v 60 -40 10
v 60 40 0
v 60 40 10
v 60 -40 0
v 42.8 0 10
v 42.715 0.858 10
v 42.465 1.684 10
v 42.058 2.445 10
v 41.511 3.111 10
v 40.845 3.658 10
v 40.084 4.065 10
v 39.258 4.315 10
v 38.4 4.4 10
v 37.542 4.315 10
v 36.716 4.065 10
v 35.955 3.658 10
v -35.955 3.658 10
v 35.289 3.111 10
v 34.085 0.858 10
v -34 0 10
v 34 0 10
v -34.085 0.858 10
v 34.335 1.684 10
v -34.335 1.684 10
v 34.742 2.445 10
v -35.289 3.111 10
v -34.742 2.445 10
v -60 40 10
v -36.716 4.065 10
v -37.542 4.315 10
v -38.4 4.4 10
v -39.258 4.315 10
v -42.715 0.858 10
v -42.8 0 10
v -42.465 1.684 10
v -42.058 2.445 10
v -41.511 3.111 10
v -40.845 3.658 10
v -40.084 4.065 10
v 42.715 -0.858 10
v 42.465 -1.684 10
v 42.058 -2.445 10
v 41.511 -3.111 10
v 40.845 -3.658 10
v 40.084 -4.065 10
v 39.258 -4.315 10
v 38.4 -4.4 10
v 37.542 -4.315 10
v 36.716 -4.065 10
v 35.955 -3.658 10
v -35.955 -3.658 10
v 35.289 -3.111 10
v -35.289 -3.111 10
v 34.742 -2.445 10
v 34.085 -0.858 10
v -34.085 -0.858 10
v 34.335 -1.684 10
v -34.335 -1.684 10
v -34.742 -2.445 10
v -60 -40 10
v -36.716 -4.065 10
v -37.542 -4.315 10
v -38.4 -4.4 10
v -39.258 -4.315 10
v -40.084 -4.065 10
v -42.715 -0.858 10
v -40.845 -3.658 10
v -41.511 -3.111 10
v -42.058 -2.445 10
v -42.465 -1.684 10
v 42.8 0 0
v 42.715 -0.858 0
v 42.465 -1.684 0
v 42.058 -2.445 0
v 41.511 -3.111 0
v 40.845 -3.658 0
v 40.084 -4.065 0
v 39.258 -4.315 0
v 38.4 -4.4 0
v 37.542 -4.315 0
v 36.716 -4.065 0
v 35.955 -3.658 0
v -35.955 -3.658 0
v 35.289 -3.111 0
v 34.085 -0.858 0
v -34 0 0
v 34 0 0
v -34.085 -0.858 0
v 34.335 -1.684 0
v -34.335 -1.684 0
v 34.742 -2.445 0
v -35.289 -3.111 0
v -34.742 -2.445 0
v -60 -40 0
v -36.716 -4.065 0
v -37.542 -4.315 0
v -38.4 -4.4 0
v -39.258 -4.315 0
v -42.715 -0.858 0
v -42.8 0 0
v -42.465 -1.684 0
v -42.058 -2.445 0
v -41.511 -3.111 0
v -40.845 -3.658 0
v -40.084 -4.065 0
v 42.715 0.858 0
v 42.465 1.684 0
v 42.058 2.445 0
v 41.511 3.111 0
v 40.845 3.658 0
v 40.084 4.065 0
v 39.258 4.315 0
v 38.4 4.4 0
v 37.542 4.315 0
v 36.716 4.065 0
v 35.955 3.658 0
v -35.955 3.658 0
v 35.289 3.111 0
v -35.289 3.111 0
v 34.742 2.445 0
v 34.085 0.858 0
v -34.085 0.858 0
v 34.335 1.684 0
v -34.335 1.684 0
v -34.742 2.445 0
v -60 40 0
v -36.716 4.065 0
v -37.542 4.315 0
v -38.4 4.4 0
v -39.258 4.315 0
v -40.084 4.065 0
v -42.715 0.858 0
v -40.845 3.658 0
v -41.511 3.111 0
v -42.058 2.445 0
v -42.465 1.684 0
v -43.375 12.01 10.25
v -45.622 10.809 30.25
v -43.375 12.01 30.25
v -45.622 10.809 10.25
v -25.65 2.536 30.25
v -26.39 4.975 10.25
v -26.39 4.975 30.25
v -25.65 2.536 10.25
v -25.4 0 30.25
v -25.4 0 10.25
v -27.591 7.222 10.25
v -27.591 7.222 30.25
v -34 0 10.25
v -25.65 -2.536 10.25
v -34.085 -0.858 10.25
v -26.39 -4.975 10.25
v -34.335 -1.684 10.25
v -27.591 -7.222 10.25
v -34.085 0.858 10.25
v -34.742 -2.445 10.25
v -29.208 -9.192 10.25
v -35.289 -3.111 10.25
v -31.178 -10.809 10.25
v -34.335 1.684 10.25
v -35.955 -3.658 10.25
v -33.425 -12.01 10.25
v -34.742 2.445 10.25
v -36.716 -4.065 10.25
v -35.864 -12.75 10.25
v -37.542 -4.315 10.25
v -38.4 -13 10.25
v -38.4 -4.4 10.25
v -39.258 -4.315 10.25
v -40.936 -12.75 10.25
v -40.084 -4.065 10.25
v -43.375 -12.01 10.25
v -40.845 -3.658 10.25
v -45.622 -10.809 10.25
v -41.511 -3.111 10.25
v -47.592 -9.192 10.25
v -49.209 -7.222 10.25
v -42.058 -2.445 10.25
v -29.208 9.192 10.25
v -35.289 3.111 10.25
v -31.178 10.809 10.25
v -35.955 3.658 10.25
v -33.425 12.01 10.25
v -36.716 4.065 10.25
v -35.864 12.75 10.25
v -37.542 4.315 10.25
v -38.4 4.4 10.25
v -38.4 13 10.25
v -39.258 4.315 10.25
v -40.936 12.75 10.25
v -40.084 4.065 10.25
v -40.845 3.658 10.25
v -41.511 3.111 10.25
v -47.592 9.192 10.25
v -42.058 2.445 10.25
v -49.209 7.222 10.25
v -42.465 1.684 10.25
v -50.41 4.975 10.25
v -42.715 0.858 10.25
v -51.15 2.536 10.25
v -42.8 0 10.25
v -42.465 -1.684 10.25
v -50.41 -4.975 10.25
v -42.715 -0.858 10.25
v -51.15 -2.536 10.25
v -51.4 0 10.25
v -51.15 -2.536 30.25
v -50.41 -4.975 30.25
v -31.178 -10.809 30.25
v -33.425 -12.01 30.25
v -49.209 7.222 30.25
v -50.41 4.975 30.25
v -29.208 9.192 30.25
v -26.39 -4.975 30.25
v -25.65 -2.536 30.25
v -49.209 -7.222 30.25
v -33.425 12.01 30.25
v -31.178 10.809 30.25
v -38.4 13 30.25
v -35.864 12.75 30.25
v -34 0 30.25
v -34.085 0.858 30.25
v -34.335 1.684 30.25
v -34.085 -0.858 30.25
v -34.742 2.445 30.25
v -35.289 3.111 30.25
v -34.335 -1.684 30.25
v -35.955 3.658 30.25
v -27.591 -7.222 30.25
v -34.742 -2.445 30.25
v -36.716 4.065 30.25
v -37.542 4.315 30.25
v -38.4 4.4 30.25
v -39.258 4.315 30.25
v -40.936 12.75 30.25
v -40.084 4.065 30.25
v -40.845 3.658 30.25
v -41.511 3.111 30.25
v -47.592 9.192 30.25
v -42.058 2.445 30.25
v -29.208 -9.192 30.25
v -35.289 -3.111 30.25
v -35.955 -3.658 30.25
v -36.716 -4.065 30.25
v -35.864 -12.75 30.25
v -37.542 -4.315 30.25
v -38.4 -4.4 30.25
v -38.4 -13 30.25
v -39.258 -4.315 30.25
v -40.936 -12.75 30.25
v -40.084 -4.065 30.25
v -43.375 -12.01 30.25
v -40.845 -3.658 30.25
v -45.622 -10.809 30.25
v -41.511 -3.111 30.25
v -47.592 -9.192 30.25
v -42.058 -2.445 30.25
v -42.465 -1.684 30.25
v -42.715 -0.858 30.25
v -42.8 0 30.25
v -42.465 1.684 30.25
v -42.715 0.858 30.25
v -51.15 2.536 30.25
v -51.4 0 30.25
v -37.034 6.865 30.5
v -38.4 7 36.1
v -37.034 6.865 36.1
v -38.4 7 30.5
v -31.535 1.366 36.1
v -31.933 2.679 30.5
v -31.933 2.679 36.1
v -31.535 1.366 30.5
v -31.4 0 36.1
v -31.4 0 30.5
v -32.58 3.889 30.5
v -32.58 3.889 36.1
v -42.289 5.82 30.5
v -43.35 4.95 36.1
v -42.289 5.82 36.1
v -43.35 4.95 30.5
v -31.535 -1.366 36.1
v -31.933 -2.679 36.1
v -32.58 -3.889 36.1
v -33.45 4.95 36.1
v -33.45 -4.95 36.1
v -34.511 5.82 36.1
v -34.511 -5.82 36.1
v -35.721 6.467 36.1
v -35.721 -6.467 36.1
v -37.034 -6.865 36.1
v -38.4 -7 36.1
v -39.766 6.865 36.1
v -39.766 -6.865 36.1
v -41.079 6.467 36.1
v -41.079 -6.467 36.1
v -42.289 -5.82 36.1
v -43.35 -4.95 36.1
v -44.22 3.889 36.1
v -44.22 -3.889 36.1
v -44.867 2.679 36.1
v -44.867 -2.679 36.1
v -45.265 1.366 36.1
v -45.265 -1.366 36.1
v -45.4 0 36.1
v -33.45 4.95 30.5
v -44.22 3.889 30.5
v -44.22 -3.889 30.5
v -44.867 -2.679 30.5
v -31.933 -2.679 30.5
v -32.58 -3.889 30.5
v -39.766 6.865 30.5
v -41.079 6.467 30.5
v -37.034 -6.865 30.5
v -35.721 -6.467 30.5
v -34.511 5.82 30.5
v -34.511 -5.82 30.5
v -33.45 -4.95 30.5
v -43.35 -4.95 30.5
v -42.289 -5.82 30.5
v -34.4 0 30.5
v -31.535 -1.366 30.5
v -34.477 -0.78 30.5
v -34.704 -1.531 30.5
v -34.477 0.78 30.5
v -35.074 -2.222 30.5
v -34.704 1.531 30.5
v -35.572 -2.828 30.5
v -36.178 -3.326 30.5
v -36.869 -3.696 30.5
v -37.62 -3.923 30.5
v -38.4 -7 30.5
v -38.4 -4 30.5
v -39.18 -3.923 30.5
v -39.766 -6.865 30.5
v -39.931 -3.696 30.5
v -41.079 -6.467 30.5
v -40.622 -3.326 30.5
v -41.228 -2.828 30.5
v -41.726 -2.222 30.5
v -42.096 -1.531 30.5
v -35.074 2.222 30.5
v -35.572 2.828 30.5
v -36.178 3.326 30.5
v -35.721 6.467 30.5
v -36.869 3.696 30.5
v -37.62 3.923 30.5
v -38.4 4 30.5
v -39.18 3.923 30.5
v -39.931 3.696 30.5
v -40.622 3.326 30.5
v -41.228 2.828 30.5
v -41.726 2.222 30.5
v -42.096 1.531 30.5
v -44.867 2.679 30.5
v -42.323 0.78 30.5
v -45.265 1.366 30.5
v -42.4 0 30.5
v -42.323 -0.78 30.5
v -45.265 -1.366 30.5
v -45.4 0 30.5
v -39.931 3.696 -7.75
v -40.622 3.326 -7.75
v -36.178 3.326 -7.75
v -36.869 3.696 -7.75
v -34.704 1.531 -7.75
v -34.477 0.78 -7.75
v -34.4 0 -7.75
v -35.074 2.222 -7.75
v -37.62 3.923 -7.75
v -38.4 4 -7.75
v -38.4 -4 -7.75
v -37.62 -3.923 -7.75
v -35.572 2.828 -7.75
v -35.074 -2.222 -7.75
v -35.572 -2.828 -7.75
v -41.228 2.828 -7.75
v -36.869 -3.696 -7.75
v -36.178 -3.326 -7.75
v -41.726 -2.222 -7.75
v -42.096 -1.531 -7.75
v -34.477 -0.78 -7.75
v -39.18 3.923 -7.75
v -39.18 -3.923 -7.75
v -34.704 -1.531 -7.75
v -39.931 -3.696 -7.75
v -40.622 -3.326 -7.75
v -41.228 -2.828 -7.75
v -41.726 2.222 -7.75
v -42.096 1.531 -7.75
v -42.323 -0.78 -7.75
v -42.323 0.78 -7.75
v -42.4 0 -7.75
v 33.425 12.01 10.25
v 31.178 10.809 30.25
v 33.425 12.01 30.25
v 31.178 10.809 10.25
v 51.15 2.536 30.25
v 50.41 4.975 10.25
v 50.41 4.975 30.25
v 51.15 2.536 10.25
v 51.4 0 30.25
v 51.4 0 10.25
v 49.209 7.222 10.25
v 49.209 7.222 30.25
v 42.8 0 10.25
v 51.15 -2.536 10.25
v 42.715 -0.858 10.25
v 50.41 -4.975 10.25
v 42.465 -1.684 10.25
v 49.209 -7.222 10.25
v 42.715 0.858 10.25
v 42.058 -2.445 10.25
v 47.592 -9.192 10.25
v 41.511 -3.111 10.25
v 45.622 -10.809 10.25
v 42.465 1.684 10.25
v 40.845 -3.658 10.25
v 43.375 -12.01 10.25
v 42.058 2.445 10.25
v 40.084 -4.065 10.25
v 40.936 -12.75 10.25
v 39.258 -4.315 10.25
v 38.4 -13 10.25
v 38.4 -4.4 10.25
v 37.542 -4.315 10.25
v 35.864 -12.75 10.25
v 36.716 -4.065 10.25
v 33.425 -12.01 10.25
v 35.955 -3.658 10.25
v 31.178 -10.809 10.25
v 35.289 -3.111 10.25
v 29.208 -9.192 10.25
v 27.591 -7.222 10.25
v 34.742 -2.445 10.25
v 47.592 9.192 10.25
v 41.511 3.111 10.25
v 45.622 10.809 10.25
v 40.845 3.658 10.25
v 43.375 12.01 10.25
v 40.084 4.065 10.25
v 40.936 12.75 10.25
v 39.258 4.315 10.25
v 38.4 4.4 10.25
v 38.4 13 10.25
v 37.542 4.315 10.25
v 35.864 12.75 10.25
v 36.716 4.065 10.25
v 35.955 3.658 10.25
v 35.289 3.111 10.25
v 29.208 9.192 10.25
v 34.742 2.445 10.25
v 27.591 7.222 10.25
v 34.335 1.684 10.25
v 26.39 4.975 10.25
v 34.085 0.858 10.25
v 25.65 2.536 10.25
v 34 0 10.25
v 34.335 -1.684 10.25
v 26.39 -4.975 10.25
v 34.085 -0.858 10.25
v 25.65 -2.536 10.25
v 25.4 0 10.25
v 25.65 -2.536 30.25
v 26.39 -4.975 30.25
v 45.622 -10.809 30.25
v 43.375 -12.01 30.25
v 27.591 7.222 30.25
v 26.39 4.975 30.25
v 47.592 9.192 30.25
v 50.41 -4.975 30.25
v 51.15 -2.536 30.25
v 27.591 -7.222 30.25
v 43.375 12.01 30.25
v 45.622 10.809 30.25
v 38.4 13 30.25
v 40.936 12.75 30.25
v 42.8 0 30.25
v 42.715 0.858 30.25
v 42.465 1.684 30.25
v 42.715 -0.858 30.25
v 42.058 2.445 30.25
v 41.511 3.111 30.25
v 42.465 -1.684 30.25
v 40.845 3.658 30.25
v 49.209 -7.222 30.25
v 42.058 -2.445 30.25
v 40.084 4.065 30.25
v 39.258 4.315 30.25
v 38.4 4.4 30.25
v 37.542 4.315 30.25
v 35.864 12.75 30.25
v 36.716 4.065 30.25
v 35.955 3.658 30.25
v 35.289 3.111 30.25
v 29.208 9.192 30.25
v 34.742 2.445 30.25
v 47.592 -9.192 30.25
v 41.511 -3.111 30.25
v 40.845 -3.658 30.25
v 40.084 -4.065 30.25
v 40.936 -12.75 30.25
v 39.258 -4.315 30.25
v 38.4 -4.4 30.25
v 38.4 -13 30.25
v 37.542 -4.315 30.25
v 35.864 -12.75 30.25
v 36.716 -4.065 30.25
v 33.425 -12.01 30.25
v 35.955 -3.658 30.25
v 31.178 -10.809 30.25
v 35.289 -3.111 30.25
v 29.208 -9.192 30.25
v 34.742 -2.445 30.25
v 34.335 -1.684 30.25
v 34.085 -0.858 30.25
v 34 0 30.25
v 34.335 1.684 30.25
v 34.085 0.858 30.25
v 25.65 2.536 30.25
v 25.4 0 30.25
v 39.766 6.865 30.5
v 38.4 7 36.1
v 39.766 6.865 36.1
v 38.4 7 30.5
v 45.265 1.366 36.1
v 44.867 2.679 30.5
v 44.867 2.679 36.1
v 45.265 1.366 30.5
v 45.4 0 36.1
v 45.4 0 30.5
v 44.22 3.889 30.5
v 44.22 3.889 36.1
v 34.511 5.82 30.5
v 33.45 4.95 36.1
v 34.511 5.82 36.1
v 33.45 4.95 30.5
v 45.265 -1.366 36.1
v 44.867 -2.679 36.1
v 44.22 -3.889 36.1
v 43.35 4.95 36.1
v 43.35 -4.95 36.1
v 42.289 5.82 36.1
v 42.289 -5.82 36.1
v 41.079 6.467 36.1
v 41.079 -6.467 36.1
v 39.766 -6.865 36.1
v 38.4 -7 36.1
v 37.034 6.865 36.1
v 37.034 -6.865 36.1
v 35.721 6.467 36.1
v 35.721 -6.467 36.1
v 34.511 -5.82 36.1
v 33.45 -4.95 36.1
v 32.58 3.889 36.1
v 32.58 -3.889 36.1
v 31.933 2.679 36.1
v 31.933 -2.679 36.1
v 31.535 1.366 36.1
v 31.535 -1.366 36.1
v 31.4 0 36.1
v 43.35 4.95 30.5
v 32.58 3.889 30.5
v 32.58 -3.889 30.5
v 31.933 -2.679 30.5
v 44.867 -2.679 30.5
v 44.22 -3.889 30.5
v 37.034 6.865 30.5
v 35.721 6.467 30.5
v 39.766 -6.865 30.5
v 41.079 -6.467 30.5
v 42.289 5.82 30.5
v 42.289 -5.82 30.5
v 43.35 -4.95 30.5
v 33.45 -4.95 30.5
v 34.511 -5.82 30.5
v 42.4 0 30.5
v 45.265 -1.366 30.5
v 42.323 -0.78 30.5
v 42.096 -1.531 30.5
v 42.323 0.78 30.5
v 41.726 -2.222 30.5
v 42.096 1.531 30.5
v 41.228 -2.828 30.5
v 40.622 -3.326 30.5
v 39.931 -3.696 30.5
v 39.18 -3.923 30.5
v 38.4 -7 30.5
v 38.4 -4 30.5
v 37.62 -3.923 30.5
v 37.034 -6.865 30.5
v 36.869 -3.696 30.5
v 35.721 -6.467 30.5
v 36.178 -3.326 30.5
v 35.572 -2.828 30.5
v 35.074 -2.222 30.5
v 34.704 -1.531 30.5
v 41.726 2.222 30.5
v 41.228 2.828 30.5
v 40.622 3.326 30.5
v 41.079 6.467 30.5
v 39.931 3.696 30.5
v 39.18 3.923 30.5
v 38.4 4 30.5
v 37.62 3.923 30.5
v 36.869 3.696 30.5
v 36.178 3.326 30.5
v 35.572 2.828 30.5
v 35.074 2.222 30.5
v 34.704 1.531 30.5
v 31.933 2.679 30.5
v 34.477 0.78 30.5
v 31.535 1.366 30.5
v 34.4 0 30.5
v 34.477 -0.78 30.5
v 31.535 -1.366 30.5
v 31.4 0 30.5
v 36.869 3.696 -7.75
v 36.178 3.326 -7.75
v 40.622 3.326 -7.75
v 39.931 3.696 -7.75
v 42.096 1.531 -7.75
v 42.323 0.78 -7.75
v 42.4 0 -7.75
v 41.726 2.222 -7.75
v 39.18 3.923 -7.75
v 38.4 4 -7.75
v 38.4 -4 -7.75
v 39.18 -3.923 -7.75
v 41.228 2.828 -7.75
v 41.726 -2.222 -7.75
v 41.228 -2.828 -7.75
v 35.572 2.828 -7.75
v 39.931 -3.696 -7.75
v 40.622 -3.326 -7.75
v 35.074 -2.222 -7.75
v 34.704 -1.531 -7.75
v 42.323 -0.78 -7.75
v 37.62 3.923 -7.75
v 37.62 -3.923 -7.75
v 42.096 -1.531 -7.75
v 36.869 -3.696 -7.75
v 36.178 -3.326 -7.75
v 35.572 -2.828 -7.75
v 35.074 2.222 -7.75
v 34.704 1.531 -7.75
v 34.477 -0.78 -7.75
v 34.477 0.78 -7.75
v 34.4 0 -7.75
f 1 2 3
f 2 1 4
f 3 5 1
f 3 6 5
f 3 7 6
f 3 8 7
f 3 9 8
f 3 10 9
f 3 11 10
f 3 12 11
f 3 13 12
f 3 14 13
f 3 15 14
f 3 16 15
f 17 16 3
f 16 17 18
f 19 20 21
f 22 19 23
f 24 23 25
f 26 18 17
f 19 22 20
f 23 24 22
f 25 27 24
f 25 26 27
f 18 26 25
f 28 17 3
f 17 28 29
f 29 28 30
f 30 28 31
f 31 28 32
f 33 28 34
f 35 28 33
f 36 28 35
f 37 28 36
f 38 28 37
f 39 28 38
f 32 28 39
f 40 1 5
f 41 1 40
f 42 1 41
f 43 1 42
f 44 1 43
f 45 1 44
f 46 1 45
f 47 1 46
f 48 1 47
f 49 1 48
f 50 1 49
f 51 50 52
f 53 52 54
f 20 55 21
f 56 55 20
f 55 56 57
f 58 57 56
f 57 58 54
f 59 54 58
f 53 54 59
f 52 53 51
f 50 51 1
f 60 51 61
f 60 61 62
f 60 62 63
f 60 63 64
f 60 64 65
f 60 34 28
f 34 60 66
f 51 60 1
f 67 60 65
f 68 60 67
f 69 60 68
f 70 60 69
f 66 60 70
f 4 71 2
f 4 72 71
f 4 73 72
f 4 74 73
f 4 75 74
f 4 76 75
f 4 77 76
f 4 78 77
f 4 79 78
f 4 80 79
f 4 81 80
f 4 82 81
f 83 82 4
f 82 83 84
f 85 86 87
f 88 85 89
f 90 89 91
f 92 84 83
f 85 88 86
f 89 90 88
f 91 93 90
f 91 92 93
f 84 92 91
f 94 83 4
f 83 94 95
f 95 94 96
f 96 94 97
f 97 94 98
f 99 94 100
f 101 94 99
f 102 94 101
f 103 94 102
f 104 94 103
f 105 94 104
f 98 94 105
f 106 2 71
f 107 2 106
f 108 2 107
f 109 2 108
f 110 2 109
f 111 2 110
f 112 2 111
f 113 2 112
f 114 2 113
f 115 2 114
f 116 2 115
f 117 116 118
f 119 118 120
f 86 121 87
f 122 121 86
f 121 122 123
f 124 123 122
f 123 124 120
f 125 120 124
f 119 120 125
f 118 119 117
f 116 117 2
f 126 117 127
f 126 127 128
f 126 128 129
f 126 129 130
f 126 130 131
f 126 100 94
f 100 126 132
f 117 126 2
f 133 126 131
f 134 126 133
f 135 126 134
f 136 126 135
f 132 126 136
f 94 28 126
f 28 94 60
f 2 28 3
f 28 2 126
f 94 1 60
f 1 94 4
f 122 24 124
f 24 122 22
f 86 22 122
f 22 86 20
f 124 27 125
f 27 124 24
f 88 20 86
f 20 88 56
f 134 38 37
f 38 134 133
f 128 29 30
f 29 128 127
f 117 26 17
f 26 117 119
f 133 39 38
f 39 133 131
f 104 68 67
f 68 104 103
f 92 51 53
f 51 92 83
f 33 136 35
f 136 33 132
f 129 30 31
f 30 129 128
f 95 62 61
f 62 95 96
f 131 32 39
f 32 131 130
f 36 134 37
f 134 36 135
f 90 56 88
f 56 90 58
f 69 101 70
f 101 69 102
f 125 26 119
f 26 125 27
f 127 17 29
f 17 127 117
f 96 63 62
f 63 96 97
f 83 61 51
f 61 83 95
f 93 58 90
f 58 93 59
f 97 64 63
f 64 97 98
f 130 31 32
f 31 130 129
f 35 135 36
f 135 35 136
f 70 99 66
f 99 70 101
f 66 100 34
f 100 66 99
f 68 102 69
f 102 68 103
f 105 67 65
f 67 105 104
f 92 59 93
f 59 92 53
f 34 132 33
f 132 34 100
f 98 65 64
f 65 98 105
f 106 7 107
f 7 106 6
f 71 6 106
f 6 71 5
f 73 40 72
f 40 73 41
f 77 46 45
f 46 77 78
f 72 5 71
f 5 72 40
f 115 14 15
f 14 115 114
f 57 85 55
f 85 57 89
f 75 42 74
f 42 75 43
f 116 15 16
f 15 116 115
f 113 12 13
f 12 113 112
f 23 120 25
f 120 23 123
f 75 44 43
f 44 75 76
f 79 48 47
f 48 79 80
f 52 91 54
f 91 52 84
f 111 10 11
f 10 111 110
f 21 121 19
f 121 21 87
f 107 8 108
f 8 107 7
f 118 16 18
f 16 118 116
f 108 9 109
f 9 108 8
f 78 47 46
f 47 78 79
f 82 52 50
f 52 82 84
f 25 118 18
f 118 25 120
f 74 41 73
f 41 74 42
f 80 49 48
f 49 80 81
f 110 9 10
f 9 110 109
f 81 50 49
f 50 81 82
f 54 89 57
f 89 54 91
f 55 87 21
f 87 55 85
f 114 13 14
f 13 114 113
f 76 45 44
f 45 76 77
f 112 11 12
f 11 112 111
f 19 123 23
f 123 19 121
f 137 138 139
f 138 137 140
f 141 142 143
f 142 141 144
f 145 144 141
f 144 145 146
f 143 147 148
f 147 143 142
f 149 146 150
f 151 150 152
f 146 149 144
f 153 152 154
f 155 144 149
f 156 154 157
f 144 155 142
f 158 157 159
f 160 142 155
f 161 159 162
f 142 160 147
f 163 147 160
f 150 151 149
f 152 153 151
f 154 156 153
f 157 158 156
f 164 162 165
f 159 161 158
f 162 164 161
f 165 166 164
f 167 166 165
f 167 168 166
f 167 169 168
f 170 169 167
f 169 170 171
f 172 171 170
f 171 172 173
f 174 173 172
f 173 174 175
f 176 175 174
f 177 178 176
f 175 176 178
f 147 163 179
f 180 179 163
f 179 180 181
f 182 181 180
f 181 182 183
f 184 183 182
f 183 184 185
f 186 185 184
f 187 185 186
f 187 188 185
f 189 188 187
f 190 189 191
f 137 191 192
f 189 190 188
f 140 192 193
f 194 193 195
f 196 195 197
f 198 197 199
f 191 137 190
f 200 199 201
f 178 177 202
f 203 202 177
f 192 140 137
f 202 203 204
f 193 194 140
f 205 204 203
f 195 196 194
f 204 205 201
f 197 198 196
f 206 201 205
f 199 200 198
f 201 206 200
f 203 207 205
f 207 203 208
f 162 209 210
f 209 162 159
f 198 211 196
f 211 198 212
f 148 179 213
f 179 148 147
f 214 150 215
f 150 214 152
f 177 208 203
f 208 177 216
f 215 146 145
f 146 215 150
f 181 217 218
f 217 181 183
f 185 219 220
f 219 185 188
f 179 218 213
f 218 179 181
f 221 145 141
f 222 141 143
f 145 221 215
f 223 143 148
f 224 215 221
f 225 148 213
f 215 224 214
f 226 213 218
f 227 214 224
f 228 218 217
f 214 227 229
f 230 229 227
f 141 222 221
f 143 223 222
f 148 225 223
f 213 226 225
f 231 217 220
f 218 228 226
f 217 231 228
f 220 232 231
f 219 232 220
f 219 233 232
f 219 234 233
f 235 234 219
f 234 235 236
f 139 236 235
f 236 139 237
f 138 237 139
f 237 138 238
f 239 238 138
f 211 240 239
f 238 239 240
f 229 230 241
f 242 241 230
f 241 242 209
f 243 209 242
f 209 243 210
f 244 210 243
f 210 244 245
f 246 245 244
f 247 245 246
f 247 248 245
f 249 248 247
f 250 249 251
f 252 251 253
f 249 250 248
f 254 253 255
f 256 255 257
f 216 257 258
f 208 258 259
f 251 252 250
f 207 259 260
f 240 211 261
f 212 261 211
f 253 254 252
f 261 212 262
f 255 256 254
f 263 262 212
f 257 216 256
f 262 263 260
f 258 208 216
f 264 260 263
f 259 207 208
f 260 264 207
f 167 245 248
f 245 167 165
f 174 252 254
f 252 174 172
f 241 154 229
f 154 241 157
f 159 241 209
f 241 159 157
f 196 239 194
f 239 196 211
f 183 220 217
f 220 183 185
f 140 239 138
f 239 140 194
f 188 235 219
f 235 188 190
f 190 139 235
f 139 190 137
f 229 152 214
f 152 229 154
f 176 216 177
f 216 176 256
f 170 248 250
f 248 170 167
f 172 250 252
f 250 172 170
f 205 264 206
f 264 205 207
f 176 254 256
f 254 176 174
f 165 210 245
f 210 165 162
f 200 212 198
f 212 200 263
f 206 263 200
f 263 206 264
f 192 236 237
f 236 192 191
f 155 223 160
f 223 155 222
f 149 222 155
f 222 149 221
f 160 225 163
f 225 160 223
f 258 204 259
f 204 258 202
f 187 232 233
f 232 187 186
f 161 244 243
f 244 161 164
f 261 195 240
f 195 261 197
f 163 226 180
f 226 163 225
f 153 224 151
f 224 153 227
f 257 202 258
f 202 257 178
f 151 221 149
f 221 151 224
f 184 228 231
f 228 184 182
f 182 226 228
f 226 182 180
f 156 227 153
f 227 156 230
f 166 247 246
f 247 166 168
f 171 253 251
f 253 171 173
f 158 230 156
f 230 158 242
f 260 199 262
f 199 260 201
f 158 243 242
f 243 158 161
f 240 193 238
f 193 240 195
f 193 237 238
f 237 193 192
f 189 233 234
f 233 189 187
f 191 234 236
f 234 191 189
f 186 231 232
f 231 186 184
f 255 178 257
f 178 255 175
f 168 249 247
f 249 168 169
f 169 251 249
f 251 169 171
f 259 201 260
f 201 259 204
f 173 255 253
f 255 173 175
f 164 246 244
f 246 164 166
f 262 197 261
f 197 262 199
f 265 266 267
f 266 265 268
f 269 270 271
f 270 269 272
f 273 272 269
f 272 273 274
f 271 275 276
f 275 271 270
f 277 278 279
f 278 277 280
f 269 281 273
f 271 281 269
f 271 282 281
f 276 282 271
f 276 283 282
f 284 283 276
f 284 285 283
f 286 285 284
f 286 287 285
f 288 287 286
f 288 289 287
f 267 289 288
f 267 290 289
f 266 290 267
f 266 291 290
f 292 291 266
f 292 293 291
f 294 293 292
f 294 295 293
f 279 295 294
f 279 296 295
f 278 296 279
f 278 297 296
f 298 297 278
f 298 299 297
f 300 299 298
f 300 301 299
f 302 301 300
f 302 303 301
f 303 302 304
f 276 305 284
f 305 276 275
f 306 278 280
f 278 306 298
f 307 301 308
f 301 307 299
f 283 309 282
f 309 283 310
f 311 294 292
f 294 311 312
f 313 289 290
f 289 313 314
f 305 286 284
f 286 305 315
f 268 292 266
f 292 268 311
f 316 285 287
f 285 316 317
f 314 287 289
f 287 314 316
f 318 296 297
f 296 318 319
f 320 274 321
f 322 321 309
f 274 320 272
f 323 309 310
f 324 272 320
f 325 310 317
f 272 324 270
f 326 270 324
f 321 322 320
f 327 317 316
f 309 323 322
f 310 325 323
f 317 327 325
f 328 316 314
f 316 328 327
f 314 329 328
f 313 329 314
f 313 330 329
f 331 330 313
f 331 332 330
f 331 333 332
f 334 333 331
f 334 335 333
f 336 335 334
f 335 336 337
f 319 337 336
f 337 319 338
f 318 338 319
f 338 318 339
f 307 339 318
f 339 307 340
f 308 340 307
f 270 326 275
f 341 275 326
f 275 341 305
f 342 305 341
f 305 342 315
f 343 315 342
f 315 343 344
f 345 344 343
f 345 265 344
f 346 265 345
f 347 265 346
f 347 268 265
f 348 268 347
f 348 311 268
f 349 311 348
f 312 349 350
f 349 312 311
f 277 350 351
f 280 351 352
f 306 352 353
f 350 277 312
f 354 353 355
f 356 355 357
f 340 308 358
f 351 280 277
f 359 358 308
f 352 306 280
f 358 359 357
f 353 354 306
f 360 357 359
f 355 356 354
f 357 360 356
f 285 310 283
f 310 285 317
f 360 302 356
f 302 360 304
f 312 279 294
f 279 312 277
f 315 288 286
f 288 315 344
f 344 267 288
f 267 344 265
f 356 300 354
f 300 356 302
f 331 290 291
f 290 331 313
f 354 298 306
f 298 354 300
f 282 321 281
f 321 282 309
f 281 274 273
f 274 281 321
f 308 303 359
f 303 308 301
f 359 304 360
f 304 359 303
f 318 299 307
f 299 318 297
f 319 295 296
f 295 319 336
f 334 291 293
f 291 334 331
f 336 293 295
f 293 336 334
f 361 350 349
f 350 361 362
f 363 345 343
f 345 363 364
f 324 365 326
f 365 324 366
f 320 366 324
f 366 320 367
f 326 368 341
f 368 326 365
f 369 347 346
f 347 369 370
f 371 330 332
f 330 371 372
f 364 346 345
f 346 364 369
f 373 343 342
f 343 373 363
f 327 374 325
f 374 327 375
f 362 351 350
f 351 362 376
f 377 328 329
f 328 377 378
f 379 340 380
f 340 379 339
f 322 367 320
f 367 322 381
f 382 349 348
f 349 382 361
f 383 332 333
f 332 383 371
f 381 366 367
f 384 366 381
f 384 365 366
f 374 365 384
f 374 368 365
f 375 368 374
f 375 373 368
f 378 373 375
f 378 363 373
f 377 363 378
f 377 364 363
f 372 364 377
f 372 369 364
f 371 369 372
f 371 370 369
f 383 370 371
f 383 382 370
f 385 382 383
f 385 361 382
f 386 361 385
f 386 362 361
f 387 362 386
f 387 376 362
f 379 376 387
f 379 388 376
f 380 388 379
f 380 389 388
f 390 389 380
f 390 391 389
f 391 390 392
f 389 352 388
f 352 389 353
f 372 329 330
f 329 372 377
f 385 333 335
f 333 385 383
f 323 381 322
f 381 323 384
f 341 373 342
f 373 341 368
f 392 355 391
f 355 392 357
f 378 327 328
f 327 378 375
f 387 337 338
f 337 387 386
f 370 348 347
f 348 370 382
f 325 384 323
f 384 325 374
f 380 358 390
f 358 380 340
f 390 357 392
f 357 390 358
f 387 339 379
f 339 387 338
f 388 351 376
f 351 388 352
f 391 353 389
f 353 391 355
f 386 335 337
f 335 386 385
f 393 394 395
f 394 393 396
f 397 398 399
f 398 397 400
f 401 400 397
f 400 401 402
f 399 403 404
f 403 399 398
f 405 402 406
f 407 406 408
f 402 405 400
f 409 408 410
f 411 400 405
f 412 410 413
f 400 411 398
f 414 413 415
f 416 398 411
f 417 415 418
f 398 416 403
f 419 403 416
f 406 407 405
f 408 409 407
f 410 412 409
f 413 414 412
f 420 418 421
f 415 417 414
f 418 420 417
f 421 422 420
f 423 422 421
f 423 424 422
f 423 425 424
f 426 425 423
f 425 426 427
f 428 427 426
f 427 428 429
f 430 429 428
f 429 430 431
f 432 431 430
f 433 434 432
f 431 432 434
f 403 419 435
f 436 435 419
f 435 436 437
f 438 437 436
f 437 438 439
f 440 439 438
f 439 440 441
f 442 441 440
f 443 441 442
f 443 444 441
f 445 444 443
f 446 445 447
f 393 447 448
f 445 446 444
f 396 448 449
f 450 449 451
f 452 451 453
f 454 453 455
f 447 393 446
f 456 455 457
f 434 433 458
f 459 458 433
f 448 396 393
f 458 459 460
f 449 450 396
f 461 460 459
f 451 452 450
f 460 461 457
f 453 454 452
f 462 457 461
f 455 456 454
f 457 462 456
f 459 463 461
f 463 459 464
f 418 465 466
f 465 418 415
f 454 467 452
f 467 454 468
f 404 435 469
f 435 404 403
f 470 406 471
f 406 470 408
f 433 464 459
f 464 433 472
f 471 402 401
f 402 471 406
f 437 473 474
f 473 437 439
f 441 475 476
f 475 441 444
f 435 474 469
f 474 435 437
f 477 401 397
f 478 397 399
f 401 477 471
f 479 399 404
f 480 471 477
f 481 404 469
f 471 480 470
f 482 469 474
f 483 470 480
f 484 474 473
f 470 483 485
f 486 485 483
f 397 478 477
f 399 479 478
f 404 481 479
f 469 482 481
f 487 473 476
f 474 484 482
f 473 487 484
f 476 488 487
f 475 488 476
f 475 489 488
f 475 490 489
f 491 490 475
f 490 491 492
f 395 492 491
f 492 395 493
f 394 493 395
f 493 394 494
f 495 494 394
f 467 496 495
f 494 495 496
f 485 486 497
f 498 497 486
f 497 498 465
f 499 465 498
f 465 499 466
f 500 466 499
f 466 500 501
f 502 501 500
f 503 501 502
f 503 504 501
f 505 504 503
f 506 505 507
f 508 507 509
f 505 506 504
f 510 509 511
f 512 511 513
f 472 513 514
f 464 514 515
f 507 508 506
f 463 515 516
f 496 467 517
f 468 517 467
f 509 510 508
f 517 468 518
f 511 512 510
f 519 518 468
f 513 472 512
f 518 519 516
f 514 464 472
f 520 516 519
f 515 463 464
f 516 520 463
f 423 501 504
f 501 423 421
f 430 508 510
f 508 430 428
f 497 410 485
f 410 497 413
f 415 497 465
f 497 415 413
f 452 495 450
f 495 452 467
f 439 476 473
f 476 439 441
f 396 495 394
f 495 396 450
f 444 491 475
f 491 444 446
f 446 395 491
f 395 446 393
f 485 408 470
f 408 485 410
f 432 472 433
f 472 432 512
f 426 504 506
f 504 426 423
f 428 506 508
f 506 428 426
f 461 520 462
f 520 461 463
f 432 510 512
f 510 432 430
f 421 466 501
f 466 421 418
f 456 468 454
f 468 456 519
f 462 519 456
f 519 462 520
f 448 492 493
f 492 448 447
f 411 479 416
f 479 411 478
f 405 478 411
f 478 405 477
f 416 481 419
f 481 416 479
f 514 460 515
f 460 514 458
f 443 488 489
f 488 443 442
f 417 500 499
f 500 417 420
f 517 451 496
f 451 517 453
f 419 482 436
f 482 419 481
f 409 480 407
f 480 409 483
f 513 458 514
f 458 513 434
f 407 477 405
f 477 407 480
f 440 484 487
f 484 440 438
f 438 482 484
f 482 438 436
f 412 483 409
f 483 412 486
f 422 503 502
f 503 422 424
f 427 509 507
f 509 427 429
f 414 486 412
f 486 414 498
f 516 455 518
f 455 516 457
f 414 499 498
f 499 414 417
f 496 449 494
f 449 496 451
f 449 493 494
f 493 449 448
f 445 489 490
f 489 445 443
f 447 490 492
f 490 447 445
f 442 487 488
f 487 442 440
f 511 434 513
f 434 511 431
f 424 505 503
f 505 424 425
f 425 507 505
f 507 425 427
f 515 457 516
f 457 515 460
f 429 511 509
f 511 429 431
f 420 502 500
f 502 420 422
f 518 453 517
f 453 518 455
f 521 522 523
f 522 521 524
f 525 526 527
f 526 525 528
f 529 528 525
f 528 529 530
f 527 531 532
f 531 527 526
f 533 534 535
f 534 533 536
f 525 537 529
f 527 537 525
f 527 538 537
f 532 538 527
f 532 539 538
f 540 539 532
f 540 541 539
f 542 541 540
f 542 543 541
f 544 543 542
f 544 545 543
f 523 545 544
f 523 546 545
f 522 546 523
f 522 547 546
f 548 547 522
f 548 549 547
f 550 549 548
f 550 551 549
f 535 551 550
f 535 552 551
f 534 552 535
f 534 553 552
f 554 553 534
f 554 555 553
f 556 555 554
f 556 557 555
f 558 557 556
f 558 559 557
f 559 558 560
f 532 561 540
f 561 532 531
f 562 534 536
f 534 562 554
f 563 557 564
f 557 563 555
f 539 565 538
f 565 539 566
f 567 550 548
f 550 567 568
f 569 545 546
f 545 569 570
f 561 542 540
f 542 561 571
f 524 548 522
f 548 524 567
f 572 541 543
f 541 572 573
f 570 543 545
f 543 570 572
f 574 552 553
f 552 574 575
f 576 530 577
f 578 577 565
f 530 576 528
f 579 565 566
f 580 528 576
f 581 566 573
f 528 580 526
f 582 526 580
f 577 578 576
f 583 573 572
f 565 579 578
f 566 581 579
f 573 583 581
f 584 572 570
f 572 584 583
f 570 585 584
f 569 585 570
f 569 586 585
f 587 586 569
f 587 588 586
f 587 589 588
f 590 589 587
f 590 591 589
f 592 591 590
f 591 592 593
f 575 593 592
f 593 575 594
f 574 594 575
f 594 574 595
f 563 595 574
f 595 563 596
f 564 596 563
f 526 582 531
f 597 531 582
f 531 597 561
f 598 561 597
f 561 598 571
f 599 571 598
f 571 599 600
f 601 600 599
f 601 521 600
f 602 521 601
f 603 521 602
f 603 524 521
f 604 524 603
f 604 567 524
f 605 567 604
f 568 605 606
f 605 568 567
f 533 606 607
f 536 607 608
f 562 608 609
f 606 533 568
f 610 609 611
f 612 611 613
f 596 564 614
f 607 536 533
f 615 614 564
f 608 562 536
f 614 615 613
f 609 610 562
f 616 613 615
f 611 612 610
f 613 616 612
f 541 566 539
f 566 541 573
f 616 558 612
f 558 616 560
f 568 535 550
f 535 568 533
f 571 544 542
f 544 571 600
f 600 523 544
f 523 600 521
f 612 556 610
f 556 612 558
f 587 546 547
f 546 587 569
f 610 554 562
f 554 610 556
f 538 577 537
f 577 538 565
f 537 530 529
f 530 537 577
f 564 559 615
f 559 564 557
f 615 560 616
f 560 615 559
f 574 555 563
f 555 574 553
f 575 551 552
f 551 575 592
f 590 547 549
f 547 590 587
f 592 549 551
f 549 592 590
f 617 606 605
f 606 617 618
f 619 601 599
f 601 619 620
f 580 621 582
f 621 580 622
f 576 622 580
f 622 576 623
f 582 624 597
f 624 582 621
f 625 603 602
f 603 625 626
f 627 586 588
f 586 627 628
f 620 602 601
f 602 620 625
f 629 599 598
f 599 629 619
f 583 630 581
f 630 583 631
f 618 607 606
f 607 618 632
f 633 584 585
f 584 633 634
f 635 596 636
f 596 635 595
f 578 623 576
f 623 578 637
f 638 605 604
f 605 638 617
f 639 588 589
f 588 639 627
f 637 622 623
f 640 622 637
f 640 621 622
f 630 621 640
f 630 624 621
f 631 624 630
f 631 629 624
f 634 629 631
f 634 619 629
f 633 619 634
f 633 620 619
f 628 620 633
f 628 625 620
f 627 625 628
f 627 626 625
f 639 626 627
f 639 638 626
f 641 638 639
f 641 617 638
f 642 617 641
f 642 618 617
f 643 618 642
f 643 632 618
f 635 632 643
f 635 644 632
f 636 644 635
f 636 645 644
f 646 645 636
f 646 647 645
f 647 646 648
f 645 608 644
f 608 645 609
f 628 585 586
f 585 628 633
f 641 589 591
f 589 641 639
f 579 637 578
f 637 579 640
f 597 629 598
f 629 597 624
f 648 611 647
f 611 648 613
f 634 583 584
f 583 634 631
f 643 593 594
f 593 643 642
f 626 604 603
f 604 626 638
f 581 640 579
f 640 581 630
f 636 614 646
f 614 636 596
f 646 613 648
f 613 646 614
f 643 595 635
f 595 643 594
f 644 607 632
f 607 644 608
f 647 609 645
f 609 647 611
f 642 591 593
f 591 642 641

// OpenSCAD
$fn = 32;

// ------------------------------------------------------------------------
// Standoff columns: 2 d26 standoffs, bolts d8
// Every part is its own module, assembly() places them once.
// ------------------------------------------------------------------------

// --- part 1 ---
module base_plate() {
  difference() {
    translate([-60, -40, 0]) cube([120, 80, 10]);
    translate([-38.4, 0, -1]) cylinder(h = 12, d = 8.8);
    translate([38.4, 0, -1]) cylinder(h = 12, d = 8.8);
  }
}

// --- part 2 ---
module spacer1() {
  difference() {
      translate([0, 0, 0]) cylinder(h = 20, d = 26);
      translate([0, 0, -1]) cylinder(h = 22, d = 8.8);
    }
}

// --- part 3 ---
module bolt1() {
  cylinder(h = 5.6, d = 14);
  translate([0, 0, -38.25]) cylinder(h = 38.25, d = 8);
}

// --- part 4 ---
module spacer2() {
  difference() {
      translate([0, 0, 0]) cylinder(h = 20, d = 26);
      translate([0, 0, -1]) cylinder(h = 22, d = 8.8);
    }
}

// --- part 5 ---
module bolt2() {
  cylinder(h = 5.6, d = 14);
  translate([0, 0, -38.25]) cylinder(h = 38.25, d = 8);
}

// --- assembly ---
module assembly() {
  translate([0, 0, 0]) rotate([0, 0, 0]) base_plate();
  translate([-38.4, 0, 10.25]) rotate([0, 0, 0]) spacer1();
  translate([-38.4, 0, 30.5]) rotate([0, 0, 0]) bolt1();
  translate([38.4, 0, 10.25]) rotate([0, 0, 0]) spacer2();
  translate([38.4, 0, 30.5]) rotate([0, 0, 0]) bolt2();
}

assembly();
